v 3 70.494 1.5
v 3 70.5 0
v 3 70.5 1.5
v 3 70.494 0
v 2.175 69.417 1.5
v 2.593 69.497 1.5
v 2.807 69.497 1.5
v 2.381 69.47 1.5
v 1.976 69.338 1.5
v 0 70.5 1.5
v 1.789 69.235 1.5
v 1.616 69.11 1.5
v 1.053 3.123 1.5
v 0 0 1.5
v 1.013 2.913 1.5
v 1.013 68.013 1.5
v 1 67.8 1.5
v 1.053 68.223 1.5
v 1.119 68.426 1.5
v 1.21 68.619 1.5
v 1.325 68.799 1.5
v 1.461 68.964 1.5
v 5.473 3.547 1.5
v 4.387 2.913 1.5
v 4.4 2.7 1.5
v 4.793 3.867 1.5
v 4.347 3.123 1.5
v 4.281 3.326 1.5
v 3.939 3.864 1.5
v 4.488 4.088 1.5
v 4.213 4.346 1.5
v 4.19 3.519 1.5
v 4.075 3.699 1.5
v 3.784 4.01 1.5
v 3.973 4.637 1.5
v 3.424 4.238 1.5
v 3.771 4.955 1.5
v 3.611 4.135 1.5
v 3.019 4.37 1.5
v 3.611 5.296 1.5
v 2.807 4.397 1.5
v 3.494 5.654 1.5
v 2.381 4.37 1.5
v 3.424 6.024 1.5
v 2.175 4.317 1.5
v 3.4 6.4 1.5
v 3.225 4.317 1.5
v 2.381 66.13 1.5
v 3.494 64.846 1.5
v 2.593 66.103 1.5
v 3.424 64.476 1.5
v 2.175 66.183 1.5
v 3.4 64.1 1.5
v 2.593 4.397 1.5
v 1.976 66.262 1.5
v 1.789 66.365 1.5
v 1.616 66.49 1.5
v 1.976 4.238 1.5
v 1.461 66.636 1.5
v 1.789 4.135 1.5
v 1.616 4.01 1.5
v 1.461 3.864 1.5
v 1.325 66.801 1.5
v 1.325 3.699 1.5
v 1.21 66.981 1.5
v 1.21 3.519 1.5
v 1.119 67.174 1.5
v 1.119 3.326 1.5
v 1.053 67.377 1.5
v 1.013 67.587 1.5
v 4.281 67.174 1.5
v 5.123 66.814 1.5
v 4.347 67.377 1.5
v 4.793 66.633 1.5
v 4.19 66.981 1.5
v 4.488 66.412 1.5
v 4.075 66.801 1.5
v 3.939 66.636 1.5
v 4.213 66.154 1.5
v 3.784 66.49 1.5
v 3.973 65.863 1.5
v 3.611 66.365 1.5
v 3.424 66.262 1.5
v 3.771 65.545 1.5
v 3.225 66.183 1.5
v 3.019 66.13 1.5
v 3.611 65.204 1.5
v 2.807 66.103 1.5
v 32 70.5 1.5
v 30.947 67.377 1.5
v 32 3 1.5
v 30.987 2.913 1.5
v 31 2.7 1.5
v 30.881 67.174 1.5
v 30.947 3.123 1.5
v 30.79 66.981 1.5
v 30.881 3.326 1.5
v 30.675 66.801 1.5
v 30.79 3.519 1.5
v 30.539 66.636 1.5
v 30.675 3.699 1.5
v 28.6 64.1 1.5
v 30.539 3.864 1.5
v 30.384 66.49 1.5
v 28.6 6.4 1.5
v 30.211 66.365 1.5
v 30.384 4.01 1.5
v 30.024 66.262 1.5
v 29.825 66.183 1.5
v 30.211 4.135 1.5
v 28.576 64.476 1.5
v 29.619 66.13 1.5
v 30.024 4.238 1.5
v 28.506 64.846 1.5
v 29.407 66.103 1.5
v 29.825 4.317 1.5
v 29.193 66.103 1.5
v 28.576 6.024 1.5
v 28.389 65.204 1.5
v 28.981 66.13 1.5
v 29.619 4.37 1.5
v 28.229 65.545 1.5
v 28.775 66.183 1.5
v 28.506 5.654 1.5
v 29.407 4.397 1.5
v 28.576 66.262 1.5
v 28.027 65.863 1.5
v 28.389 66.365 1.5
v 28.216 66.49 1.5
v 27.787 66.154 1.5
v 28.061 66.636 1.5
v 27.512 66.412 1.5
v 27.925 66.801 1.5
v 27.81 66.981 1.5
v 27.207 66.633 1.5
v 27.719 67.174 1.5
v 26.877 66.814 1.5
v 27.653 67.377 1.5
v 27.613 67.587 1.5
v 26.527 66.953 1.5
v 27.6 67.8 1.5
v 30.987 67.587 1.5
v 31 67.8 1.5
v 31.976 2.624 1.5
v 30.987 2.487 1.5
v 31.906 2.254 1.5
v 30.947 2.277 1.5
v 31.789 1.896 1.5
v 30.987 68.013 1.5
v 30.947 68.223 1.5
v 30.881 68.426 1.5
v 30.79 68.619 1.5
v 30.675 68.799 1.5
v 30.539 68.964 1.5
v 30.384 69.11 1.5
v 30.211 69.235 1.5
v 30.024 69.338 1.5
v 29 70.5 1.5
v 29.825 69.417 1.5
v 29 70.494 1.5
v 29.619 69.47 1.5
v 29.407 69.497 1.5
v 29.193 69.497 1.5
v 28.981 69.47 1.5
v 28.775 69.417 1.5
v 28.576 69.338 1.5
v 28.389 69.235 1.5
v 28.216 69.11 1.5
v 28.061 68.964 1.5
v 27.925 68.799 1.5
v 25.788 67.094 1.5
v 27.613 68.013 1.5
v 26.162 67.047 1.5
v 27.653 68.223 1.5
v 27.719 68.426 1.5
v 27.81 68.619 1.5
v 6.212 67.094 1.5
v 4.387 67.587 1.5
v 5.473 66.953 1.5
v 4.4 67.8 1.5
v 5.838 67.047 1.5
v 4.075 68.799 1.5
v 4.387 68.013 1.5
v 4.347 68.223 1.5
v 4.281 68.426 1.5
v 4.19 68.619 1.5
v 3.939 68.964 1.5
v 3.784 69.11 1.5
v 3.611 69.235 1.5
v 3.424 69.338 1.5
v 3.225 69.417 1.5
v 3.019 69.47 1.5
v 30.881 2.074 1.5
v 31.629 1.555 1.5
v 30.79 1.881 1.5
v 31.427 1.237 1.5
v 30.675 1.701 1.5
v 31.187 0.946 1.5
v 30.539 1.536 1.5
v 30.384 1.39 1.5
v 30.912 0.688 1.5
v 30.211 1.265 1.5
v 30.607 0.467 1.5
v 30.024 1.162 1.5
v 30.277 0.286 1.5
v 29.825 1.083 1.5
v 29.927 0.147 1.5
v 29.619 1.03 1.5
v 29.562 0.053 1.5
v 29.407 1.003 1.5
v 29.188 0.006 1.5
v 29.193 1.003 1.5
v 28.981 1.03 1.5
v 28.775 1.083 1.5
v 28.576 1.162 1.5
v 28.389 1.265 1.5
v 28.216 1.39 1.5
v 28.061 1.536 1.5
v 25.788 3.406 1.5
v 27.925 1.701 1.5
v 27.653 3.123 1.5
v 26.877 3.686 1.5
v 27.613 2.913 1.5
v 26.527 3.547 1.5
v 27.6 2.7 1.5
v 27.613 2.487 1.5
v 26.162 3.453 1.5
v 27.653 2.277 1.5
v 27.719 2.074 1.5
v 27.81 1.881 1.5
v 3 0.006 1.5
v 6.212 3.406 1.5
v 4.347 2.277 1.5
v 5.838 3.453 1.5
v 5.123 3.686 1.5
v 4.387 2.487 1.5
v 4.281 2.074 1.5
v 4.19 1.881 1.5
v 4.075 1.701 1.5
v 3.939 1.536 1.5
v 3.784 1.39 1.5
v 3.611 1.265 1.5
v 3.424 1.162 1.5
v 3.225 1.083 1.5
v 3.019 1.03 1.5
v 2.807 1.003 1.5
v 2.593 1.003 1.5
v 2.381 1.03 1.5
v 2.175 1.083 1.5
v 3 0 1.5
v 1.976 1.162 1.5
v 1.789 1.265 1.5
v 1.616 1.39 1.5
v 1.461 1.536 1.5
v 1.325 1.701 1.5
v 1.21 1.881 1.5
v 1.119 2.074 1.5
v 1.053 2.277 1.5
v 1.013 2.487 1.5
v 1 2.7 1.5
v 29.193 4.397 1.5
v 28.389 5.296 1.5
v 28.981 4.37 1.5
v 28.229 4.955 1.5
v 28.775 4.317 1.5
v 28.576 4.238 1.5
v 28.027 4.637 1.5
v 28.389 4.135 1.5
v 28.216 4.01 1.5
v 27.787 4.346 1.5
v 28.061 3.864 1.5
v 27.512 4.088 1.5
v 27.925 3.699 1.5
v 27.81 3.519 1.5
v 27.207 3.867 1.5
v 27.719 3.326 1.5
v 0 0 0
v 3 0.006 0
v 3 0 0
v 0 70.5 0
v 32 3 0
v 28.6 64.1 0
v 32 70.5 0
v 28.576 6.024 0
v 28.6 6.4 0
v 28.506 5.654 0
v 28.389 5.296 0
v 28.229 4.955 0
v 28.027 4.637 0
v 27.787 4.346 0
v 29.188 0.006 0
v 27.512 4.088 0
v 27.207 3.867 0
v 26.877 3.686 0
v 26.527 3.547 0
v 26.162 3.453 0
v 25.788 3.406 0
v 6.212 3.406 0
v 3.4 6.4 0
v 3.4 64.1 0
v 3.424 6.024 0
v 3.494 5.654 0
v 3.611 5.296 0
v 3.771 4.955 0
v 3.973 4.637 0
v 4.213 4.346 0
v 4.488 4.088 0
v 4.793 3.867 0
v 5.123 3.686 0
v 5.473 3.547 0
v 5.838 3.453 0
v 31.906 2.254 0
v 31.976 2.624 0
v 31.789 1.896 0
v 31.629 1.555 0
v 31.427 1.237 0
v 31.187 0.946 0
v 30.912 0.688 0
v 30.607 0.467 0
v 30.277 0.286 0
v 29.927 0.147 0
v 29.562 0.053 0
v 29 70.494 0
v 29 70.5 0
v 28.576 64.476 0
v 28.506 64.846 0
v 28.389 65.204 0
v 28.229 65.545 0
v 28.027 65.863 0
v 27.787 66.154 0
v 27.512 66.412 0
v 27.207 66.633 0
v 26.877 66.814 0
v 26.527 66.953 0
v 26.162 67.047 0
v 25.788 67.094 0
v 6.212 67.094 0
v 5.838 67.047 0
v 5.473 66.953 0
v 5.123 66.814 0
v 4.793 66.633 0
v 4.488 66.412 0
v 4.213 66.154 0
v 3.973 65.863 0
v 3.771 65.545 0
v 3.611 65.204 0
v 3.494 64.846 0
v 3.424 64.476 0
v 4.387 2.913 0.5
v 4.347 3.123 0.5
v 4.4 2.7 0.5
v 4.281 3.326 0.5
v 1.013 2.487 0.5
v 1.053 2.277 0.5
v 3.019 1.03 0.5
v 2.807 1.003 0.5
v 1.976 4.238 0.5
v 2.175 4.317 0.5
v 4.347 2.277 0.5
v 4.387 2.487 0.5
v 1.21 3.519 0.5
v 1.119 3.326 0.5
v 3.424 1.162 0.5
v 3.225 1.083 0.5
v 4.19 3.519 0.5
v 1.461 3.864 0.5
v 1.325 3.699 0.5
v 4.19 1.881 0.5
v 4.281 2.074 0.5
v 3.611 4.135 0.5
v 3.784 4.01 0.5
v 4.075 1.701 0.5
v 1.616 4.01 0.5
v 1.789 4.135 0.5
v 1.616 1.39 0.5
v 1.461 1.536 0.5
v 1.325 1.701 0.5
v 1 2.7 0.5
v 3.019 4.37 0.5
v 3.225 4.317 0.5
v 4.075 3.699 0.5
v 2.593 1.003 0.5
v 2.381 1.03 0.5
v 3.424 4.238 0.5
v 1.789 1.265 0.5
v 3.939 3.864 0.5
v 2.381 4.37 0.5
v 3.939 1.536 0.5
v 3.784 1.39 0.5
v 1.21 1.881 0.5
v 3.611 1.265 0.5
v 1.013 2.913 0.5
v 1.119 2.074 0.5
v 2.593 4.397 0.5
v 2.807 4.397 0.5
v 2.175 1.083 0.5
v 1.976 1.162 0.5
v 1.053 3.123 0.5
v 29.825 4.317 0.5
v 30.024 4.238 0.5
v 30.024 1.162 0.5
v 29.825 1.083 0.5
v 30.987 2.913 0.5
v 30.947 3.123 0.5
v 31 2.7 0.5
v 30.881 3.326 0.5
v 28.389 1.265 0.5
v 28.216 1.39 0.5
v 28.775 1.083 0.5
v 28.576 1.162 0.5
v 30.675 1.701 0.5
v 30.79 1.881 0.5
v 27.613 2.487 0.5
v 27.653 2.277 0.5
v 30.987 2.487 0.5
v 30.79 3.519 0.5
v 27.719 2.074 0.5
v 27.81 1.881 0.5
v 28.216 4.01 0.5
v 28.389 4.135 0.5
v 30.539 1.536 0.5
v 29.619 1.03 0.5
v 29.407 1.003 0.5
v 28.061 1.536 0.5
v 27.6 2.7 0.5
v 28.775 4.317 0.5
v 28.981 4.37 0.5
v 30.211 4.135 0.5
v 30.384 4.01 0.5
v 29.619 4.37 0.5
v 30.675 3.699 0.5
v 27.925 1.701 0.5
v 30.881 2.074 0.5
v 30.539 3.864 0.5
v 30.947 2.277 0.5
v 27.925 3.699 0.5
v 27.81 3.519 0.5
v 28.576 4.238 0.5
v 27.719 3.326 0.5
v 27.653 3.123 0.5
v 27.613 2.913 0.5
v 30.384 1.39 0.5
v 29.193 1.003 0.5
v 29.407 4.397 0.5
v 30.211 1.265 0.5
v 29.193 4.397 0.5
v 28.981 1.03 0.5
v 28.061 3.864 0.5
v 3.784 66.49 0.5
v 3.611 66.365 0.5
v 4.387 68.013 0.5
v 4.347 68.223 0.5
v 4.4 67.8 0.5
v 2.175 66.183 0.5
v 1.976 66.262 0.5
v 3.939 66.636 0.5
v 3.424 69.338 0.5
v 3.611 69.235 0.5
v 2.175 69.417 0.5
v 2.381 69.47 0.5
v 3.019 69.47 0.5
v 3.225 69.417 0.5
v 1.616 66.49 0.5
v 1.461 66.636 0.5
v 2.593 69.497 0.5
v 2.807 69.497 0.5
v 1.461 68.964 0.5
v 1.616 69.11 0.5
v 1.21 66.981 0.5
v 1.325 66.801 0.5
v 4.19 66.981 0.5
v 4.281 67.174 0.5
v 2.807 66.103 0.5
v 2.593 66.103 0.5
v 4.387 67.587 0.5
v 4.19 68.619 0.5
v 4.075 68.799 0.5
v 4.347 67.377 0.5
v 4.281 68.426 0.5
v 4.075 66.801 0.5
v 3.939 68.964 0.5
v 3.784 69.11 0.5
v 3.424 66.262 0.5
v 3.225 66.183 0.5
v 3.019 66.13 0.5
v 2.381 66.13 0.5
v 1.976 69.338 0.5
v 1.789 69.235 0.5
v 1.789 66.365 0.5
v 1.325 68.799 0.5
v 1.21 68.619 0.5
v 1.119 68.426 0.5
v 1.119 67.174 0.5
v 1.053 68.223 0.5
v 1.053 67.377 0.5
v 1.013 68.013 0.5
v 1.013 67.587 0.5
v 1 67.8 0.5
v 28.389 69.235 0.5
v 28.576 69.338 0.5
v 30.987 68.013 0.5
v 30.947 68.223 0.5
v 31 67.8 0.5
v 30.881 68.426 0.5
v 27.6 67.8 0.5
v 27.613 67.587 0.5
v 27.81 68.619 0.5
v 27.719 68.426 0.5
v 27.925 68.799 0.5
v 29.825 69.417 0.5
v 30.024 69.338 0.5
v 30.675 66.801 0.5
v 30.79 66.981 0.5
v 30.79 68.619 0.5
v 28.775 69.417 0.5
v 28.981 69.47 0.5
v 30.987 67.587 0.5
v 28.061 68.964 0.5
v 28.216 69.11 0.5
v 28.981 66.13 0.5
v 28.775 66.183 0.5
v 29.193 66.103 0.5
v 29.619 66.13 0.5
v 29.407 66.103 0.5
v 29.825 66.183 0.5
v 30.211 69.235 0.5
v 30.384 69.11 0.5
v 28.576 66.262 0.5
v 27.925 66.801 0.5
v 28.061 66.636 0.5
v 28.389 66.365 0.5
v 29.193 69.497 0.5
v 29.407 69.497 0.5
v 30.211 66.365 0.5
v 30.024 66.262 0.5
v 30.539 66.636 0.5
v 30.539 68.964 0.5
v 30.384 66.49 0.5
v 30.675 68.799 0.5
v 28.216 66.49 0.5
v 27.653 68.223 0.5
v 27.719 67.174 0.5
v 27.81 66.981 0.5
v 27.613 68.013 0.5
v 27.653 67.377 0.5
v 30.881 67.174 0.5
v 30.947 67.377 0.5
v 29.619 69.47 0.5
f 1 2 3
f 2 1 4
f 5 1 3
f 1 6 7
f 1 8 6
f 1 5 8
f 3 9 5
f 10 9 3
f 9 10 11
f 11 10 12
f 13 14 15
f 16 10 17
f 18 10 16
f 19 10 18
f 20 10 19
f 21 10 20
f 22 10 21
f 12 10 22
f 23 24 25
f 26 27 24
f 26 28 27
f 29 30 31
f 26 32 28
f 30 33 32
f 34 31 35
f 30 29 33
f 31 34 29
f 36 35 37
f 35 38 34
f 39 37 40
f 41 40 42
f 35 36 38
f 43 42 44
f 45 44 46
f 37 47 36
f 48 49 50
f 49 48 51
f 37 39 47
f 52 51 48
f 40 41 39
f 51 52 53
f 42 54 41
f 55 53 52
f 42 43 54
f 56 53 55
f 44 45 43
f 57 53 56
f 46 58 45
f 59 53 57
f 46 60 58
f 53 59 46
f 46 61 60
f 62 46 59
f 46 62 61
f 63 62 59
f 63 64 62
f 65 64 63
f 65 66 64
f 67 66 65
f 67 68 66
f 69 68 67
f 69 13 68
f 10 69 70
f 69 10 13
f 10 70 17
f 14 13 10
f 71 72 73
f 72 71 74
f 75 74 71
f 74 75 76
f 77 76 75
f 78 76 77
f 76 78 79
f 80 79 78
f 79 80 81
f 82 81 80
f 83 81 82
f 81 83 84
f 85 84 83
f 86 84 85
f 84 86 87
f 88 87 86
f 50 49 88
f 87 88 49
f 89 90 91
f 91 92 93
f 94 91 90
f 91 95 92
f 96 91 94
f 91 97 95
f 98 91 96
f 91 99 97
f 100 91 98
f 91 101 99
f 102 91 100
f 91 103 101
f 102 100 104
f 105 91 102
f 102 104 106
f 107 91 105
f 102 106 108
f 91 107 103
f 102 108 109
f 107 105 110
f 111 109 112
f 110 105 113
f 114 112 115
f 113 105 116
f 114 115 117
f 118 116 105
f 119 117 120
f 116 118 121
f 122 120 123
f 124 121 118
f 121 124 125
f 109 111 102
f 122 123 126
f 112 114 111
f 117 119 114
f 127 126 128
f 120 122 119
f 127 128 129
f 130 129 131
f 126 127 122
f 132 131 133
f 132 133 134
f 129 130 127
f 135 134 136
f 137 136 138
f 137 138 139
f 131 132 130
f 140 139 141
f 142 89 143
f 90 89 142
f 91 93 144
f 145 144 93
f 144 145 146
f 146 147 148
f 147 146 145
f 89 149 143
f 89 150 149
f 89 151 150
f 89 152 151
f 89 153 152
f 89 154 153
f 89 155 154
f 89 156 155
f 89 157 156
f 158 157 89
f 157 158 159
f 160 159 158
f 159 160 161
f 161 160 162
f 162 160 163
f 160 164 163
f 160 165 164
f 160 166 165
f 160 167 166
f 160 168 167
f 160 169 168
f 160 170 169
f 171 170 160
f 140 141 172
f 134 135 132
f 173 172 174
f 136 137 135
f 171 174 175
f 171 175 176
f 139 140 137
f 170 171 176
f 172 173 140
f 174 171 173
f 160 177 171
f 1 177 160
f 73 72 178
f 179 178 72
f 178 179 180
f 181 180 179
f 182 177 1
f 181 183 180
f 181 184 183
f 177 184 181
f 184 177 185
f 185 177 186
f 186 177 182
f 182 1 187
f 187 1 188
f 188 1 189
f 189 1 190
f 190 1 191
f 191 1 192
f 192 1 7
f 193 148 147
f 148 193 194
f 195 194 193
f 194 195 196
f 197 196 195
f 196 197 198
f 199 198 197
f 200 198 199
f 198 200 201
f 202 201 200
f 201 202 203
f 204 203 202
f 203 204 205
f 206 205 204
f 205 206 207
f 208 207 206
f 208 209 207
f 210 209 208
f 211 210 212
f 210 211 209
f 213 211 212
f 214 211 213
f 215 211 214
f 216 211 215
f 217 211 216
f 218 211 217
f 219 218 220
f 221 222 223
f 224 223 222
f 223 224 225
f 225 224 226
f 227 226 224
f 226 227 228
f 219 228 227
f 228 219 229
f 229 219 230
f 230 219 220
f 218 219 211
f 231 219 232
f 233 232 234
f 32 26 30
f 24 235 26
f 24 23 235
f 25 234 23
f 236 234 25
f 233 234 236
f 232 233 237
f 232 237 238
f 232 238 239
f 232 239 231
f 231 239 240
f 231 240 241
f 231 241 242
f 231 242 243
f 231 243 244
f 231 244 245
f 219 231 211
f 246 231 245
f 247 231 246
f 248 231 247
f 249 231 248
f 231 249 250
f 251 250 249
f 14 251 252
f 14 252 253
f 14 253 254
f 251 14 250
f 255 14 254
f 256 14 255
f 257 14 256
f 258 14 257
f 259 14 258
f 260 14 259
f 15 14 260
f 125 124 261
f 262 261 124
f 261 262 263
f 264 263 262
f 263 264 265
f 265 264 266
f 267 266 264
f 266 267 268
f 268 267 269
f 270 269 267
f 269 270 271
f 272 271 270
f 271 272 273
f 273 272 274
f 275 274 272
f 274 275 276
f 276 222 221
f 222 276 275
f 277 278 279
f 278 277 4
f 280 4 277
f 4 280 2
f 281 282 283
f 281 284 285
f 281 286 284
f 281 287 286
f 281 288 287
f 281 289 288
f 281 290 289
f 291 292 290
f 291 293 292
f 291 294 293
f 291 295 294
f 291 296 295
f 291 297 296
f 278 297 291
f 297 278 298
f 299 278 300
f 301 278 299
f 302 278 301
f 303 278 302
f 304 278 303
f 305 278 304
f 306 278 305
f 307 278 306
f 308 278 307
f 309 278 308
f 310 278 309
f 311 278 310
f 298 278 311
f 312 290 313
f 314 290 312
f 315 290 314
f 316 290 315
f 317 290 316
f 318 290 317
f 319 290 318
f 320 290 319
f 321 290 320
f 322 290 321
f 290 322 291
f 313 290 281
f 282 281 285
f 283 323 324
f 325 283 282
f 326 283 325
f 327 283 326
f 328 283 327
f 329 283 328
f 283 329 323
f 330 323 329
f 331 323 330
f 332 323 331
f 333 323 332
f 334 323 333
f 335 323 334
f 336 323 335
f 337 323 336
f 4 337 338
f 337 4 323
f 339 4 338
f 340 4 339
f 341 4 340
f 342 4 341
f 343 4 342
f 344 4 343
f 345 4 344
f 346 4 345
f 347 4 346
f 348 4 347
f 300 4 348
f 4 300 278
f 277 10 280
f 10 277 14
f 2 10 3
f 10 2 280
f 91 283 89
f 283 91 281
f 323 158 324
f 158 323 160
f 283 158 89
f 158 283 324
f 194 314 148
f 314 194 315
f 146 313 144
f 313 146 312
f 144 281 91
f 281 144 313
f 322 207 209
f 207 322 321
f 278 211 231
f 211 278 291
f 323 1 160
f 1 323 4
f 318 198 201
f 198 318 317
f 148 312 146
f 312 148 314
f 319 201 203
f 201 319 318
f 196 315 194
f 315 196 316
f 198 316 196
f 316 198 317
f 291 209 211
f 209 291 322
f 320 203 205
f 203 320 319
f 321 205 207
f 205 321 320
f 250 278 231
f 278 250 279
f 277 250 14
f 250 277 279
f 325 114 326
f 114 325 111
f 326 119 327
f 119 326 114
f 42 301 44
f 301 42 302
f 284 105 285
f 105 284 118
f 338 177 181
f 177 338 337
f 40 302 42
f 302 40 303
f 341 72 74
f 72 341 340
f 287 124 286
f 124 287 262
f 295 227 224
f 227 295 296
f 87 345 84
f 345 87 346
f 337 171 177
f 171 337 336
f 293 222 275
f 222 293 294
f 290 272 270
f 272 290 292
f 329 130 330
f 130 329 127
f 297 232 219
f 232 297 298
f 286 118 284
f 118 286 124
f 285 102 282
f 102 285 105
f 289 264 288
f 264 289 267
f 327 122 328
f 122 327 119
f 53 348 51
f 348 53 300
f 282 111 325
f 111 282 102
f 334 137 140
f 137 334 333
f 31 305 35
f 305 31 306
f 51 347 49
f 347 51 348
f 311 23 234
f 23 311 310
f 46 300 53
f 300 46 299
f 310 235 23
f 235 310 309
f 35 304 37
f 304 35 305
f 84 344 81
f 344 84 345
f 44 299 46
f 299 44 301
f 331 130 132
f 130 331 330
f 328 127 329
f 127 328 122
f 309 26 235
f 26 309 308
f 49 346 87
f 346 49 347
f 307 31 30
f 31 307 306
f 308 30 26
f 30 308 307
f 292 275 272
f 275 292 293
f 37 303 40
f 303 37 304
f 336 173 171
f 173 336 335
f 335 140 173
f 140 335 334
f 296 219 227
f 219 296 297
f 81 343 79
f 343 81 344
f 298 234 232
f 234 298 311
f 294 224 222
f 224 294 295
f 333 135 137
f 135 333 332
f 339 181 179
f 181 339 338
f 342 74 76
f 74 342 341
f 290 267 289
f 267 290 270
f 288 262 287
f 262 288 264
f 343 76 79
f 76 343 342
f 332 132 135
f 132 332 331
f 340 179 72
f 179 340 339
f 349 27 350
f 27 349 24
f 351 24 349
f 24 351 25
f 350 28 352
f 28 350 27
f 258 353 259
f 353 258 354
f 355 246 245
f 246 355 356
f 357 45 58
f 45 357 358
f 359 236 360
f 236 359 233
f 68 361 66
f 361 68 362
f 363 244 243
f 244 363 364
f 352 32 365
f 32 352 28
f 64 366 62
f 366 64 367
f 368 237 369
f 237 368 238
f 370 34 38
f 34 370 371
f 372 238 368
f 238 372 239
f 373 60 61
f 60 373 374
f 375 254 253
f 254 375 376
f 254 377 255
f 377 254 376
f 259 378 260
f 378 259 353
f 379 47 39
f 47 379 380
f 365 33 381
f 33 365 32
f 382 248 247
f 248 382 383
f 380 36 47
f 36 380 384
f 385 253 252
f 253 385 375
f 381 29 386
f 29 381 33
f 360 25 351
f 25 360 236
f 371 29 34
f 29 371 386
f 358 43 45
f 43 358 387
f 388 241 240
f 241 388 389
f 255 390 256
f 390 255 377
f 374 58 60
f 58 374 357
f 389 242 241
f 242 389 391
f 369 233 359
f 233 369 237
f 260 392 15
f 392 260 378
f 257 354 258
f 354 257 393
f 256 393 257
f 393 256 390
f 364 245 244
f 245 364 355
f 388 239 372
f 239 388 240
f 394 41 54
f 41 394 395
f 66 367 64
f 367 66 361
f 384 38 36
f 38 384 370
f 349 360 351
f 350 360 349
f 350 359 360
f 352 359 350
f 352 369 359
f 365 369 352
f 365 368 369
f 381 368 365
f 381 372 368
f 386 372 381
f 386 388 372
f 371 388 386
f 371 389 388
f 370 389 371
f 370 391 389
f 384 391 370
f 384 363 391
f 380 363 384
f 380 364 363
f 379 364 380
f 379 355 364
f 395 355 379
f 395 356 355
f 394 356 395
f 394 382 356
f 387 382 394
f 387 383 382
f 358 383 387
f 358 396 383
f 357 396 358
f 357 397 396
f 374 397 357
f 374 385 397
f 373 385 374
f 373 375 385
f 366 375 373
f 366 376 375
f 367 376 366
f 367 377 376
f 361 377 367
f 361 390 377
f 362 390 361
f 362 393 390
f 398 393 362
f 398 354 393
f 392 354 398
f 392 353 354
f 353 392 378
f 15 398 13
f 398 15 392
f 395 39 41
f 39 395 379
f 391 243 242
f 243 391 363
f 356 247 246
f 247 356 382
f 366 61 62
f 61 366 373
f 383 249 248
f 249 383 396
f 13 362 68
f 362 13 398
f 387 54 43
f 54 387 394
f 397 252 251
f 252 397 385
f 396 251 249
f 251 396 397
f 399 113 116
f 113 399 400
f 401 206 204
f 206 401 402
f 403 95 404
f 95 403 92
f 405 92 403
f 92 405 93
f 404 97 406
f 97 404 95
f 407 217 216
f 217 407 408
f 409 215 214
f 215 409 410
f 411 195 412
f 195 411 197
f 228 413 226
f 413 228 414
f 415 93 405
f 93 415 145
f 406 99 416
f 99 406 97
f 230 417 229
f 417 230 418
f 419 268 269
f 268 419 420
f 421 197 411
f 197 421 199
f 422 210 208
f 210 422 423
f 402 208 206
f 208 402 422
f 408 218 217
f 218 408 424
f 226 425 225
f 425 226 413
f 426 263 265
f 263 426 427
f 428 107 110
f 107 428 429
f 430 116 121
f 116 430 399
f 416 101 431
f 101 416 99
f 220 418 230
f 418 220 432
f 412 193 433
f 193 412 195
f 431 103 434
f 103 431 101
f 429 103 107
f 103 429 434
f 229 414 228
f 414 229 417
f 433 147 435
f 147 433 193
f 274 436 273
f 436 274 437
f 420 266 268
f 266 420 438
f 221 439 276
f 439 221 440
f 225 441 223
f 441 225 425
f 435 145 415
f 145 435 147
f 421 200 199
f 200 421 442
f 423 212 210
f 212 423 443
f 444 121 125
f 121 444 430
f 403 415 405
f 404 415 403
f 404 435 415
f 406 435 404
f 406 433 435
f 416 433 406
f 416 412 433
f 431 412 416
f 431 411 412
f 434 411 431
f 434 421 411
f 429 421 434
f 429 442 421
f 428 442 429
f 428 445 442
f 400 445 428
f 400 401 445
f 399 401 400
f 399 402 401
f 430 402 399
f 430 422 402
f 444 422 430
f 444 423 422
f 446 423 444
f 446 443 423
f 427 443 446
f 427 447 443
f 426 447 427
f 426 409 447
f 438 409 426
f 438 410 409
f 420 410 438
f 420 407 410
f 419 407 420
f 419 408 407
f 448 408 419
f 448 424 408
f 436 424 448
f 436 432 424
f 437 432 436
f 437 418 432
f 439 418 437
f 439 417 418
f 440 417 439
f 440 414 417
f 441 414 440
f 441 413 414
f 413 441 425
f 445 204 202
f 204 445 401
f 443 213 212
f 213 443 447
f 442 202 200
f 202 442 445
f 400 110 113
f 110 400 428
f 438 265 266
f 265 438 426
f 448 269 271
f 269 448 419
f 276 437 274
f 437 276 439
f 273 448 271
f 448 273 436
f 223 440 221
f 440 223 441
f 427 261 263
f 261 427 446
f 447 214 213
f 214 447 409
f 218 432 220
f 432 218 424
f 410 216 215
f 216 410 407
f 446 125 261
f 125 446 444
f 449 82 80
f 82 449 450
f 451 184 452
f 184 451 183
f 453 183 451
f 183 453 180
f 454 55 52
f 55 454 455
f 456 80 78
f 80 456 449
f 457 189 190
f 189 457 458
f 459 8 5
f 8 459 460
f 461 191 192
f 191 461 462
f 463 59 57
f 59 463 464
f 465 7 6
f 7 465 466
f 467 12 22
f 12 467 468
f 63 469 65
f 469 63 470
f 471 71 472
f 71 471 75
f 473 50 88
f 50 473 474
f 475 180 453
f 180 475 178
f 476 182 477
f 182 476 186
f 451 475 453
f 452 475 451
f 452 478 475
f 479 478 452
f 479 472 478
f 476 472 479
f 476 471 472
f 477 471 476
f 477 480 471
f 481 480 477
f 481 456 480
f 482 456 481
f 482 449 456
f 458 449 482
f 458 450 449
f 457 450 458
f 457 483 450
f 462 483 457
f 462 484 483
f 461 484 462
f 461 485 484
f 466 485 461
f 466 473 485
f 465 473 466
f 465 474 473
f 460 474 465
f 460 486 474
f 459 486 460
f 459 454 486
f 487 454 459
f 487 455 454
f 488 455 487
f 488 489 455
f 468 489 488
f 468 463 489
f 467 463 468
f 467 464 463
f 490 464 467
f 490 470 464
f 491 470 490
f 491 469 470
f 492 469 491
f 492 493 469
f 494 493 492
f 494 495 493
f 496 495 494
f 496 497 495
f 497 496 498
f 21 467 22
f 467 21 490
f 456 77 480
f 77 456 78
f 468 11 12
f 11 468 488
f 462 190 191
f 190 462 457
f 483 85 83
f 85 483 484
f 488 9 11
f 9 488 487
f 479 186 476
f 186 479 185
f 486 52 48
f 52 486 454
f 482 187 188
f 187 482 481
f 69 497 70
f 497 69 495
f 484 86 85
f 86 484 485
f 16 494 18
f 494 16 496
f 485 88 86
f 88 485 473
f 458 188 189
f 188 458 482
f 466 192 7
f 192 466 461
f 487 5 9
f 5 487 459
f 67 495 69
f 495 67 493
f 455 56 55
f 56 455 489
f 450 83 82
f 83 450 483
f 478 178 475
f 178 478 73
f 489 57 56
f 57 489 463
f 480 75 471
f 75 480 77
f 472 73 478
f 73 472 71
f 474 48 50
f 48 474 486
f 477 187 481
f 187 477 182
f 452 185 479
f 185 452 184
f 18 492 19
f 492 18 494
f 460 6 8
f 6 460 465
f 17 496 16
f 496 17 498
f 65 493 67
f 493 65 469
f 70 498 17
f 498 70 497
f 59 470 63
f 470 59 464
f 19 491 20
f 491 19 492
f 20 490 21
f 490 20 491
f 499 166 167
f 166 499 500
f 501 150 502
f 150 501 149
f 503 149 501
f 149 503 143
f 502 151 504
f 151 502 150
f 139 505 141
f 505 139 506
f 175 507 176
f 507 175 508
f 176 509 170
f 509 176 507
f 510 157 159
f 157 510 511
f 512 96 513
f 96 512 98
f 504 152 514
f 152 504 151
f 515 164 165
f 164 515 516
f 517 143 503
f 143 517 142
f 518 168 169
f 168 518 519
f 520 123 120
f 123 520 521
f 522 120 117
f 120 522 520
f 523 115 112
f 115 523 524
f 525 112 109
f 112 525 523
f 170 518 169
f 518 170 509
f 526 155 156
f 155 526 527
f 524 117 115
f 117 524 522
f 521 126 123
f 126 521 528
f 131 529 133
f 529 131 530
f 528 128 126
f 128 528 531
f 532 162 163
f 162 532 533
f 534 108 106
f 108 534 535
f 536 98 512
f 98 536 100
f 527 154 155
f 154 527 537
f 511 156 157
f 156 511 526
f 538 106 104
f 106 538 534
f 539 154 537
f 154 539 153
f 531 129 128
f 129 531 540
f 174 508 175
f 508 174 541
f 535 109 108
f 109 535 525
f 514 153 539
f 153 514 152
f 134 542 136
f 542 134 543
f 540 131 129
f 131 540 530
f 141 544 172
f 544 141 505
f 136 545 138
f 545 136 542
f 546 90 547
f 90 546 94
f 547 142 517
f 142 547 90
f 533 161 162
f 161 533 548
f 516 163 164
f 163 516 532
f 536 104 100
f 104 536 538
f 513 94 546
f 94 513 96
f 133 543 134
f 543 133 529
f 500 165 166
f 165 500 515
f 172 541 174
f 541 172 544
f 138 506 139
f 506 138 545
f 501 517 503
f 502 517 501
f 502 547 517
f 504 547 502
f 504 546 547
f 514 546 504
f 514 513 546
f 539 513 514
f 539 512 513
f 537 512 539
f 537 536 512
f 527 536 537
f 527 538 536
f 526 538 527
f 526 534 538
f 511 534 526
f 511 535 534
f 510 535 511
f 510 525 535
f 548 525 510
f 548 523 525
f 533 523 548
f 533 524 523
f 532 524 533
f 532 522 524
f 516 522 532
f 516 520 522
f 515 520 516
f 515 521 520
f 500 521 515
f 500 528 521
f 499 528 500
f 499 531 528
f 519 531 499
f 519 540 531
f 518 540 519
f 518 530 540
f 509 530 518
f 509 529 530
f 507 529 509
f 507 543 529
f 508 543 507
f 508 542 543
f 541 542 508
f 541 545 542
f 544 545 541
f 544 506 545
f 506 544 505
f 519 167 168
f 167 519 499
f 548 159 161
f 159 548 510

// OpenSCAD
// file: ../../lib/square_torus.scad
include <./rounded_cube.scad>
include <./rounded_square.scad>

$rounding = 3;
$bleed = 1;

module rounded_corner(size, flat_top=false, flat_bottom=false) {
  rotate_extrude(angle=90) {
    translate([$rounding, 0, 0]) {
      rounded_square(size, flat_top=flat_top, flat_bottom=flat_bottom);
    }
  }
}

module square_torus(size, girth, flat_top=false, flat_bottom=false) {
  shaft_size = [
    size[0] - ($rounding + girth) * 2,
    size[1] - ($rounding + girth) * 2,
    size[2] - $rounding * 2 ,
  ];

  union() {
    // Bottom
    translate([girth + $rounding, 0, 0]) {
      rotate(a=[90, 0, 90]) {
        linear_extrude(shaft_size[0]) {
          rounded_square([girth, size[2]], flat_top=flat_top, flat_bottom=flat_bottom);
        }
      }
    }
    // Left
    translate([0, shaft_size[1] + girth + $rounding, 0]) {
      rotate(a=[90, 0, 0]) {
        linear_extrude(shaft_size[1]) {
          rounded_square([girth, size[2]], flat_top=flat_top, flat_bottom=flat_bottom);
        }
      }
    }
    // Top 
    translate([girth + $rounding, shaft_size[1] + girth + $rounding * 2, 0]) {
      rotate(a=[90, 0, 90]) {
        linear_extrude(shaft_size[0]) {
          rounded_square([girth, size[2]], flat_top=flat_top, flat_bottom=flat_bottom);
        }
      }
    }
    // Right
    translate([shaft_size[0] + girth + $rounding * 2, shaft_size[1] + girth + $rounding, 0]) {
      rotate(a=[90, 0, 0]) {
        linear_extrude(shaft_size[1]) {
          rounded_square([girth, size[2]], flat_top=flat_top, flat_bottom=flat_bottom);
        }
      }
    }

    translate([girth + $rounding, girth + $rounding, 0]) {
      // Bottom left corner
      rotate(180) {
        rounded_corner([girth, size[2]], flat_top=flat_top, flat_bottom=flat_bottom);
      }
      // Bottom right corner
      translate([shaft_size[0], 0, 0]) {
        rotate(270) {
          rounded_corner([girth, size[2]], flat_top=flat_top, flat_bottom=flat_bottom);
        }
      }
      // Top left corner
      translate([0, shaft_size[1], 0]) {
        rotate(90) {
          rounded_corner([girth, size[2]], flat_top=flat_top, flat_bottom=flat_bottom);
        }
      }
      // Top right corner
      translate([shaft_size[0], shaft_size[1], 0]) {
        rounded_corner([girth, size[2]], flat_top=flat_top, flat_bottom=flat_bottom);
      }
    }
  } 
}
// file: ../../lib/rounded_square.scad
$bleed = 1;
$rounding = 3;

module rounded_square(size) {
  inner_size = [
    size[0] - $rounding * 2,
    size[1] - $rounding * 2,
  ];

  minkowski() {
    translate([$rounding, $rounding, 0]) {
      square(inner_size);
    }
    circle($rounding);
  }
}
// file: ../../lib/elephant_foot.scad
include <./rounded_cube.scad>
include <./square_torus.scad>

$rounding = 3;
$bleed = 0.01;

// TODO investigate poor performance

// TODO use bleed_top|bottom help with differencing a foot
module elephant_foot(
  size, 
  flat_top=false, 
  flat_bottom=false,
  rounded_top=false,
  rounded_bottom=false,
  use_bleed=false
) {
  foot_top = !(flat_top || rounded_top);
  foot_bottom = !(flat_bottom || rounded_bottom);
  assert(foot_top || foot_bottom, "Elephan foot can only have flat/rounded top or bottom not both");

  girth = ($rounding + $bleed) * 2;

  torus_size = [
    size[0] + (girth - $rounding) * 2,
    size[1] + (girth - $rounding) * 2,
    $rounding + $bleed
  ];

  torus_offset = [
    0 - (torus_size[0] - size[0]) / 2,
    0 - (torus_size[1] - size[1]) / 2,
  ];

  foot_size = [
    size[0],
    size[1],
    $rounding + (use_bleed ? $bleed: 0)
  ];

  foot_top_height = foot_top ? $rounding : 0;
  foot_bottom_height = foot_bottom ? $rounding : 0;

  inner_size = [
    size[0] - $rounding * 2,
    size[1] - $rounding * 2,
    size[2] - max(0, foot_top_height -1) - max(0, foot_bottom_height - 1),
  ];

  union() {
    if (foot_bottom) {
      difference() {
        translate([0, 0, 0 - (use_bleed && foot_bottom ? $bleed: 0)]) {
          rounded_cube(foot_size, flat=true);
        }
        translate(torus_offset) {
          square_torus(torus_size, girth, flat_top=true);
        }
      }
    }

    translate([$rounding, $rounding, foot_bottom_height]) {
      rounded_cube(
        inner_size, 
        flat_top=flat_top || foot_top, 
        flat_bottom=flat_bottom || foot_bottom
      );
    }

    if (foot_top) {
      translate([0, 0, inner_size[2] - 1 + foot_bottom_height]) {
        difference() {
          rounded_cube(foot_size, flat=true);
          translate([torus_offset[0], torus_offset[1], -$bleed]) {
            square_torus(torus_size, girth, flat_bottom=true);
          }
        }
      }
    }
  }
}
// file: ../../lib/rounded_cube.scad
include <./rounded_square.scad>

$bleed = 1;
$rounding = 3;

// Render a rounded cube
// flat_top: do not round the top edges
// flat_bottom: do not round the bottom edges
// flat: equals flat_top && flat_bottom
// 
// Limitations:
// requires height > $rounding * 2
// flat_top || flat_bottom requires height > $rounding
// flat_top && flat_bottom requires height > $bleed
module rounded_cube(
  size, 
  flat=false, 
  flat_top=false, 
  flat_bottom=false,
  side_rounding=-1
) {
  _flat = flat || (flat_top && flat_bottom);
  _flat_top = flat_top || flat;
  _flat_bottom = flat_bottom || flat;
  _rounding = min($rounding, size[2] / 2);
  _side_rounding = side_rounding > -1 ? side_rounding: $rounding;

  assert(_side_rounding >= $rounding, "side rounding cannot be less than rounding");

  top_height = _flat_top ? 0: _rounding;
  bottom_height = _flat_bottom ? 0: _rounding;

  cube_size = [
    size[0] - _rounding * 2,
    size[1] - _rounding * 2,
    size[2] - (top_height + bottom_height)
  ];

  if (_flat_top && _flat_bottom) {
     linear_extrude(cube_size[2]) {
       rounded_square([size[0], size[1]]);
     }
  } else {
    minkowski() {
      translate([_rounding, _rounding, bottom_height]) {
        if (_side_rounding != _rounding) {
          linear_extrude(cube_size[2]) {
            rounded_square([cube_size[0], cube_size[1]], $rounding=_side_rounding);
          }
        } else {
          cube(cube_size);
        }
      }

      if (_flat_top) {
        difference() {
          sphere(_rounding);
          cylinder(_rounding, _rounding, _rounding);
        }
      } else if (_flat_bottom) {
        difference() {
          sphere(_rounding);
          translate ([0, 0, -_rounding]) {
            cylinder(_rounding, _rounding, _rounding);
          }
        }
      } else {
        sphere(_rounding);
      }
    }
  }
}
// main file
echo(version=version());

include <../../lib/rounded_cube.scad>
include <../../lib/elephant_foot.scad>

// Config
$fn = 50;
$bleed = 1;
$rounding = 3;

// From dashboard bottom
size = [
  32, 
  70.5, 
  5
];

inner_size = [
  23.2, 
  61.7, 
  2.7
];

// Attributes
inset = 1;
min_magnet_height_buffer = 0.5;
magnet_height = 1;
magnet_diameter = 3.4;
corner_magnet_buffer = 1;
border_width = 4.5;
card_width = size[0];
card_length = size[1];
window_buffer = 1;
foot_rounding = 3;

// Derived Attributes
base_height = magnet_height + min_magnet_height_buffer;
corner_magnet_offset = corner_magnet_buffer + magnet_diameter / 2;

base_size = [
  size[0],
  size[1],
  base_height
];

snap_inset_size = [
  inner_size[0],
  inner_size[1],
  inset
];

foot_size = [
  snap_inset_size[0] + window_buffer * 2,
  snap_inset_size[1] + window_buffer * 2,
  base_height + inset + $bleed
];

snap_inset_offset = [
  (base_size[0] - snap_inset_size[0]) / 2,
  (base_size[1] - snap_inset_size[1]) / 2,
  base_height
];

foot_offset = [
  snap_inset_offset[0] + (snap_inset_size[0] - foot_size[0]) / 2,
  snap_inset_offset[1] + (snap_inset_size[1] - foot_size[1]) / 2,
  0
];

corner_hole_offsets = [
  [corner_magnet_offset, corner_magnet_offset],
  [base_size[0] - corner_magnet_offset, corner_magnet_offset],
  [corner_magnet_offset, base_size[1] - corner_magnet_offset],
  [base_size[0] - corner_magnet_offset, base_size[1] - corner_magnet_offset],
];

// TODO z-tearing why? probs the union gap from foot module

// Model
difference() {
  // Base
  union() {
    rounded_cube(base_size, flat=true);

    // Square 3 corners
    cube([$rounding, $rounding, base_height]);
    translate([0, base_size[1] - $rounding, 0]) {
      cube([$rounding, $rounding, base_height]);
      translate([base_size[0] - $rounding, 0, 0]) {
        cube([$rounding, $rounding, base_height]);
      }
    }

    translate(snap_inset_offset) {
      cube(snap_inset_size);
    }
  }
  // Cut out window
  translate(foot_offset) {
    // TODO foot curves back down in corner wtf
    elephant_foot(foot_size, flat_top=true, use_bleed=true, $rounding=foot_rounding);
  }
  // Cut out corner magnet holes
  translate([0, 0, base_height-magnet_height]) {
    for (i=corner_hole_offsets) {
      translate([i[0], i[1], 0]) {
        cylinder(h=magnet_height + $bleed, d=magnet_diameter);
      }
    }
  }
}
